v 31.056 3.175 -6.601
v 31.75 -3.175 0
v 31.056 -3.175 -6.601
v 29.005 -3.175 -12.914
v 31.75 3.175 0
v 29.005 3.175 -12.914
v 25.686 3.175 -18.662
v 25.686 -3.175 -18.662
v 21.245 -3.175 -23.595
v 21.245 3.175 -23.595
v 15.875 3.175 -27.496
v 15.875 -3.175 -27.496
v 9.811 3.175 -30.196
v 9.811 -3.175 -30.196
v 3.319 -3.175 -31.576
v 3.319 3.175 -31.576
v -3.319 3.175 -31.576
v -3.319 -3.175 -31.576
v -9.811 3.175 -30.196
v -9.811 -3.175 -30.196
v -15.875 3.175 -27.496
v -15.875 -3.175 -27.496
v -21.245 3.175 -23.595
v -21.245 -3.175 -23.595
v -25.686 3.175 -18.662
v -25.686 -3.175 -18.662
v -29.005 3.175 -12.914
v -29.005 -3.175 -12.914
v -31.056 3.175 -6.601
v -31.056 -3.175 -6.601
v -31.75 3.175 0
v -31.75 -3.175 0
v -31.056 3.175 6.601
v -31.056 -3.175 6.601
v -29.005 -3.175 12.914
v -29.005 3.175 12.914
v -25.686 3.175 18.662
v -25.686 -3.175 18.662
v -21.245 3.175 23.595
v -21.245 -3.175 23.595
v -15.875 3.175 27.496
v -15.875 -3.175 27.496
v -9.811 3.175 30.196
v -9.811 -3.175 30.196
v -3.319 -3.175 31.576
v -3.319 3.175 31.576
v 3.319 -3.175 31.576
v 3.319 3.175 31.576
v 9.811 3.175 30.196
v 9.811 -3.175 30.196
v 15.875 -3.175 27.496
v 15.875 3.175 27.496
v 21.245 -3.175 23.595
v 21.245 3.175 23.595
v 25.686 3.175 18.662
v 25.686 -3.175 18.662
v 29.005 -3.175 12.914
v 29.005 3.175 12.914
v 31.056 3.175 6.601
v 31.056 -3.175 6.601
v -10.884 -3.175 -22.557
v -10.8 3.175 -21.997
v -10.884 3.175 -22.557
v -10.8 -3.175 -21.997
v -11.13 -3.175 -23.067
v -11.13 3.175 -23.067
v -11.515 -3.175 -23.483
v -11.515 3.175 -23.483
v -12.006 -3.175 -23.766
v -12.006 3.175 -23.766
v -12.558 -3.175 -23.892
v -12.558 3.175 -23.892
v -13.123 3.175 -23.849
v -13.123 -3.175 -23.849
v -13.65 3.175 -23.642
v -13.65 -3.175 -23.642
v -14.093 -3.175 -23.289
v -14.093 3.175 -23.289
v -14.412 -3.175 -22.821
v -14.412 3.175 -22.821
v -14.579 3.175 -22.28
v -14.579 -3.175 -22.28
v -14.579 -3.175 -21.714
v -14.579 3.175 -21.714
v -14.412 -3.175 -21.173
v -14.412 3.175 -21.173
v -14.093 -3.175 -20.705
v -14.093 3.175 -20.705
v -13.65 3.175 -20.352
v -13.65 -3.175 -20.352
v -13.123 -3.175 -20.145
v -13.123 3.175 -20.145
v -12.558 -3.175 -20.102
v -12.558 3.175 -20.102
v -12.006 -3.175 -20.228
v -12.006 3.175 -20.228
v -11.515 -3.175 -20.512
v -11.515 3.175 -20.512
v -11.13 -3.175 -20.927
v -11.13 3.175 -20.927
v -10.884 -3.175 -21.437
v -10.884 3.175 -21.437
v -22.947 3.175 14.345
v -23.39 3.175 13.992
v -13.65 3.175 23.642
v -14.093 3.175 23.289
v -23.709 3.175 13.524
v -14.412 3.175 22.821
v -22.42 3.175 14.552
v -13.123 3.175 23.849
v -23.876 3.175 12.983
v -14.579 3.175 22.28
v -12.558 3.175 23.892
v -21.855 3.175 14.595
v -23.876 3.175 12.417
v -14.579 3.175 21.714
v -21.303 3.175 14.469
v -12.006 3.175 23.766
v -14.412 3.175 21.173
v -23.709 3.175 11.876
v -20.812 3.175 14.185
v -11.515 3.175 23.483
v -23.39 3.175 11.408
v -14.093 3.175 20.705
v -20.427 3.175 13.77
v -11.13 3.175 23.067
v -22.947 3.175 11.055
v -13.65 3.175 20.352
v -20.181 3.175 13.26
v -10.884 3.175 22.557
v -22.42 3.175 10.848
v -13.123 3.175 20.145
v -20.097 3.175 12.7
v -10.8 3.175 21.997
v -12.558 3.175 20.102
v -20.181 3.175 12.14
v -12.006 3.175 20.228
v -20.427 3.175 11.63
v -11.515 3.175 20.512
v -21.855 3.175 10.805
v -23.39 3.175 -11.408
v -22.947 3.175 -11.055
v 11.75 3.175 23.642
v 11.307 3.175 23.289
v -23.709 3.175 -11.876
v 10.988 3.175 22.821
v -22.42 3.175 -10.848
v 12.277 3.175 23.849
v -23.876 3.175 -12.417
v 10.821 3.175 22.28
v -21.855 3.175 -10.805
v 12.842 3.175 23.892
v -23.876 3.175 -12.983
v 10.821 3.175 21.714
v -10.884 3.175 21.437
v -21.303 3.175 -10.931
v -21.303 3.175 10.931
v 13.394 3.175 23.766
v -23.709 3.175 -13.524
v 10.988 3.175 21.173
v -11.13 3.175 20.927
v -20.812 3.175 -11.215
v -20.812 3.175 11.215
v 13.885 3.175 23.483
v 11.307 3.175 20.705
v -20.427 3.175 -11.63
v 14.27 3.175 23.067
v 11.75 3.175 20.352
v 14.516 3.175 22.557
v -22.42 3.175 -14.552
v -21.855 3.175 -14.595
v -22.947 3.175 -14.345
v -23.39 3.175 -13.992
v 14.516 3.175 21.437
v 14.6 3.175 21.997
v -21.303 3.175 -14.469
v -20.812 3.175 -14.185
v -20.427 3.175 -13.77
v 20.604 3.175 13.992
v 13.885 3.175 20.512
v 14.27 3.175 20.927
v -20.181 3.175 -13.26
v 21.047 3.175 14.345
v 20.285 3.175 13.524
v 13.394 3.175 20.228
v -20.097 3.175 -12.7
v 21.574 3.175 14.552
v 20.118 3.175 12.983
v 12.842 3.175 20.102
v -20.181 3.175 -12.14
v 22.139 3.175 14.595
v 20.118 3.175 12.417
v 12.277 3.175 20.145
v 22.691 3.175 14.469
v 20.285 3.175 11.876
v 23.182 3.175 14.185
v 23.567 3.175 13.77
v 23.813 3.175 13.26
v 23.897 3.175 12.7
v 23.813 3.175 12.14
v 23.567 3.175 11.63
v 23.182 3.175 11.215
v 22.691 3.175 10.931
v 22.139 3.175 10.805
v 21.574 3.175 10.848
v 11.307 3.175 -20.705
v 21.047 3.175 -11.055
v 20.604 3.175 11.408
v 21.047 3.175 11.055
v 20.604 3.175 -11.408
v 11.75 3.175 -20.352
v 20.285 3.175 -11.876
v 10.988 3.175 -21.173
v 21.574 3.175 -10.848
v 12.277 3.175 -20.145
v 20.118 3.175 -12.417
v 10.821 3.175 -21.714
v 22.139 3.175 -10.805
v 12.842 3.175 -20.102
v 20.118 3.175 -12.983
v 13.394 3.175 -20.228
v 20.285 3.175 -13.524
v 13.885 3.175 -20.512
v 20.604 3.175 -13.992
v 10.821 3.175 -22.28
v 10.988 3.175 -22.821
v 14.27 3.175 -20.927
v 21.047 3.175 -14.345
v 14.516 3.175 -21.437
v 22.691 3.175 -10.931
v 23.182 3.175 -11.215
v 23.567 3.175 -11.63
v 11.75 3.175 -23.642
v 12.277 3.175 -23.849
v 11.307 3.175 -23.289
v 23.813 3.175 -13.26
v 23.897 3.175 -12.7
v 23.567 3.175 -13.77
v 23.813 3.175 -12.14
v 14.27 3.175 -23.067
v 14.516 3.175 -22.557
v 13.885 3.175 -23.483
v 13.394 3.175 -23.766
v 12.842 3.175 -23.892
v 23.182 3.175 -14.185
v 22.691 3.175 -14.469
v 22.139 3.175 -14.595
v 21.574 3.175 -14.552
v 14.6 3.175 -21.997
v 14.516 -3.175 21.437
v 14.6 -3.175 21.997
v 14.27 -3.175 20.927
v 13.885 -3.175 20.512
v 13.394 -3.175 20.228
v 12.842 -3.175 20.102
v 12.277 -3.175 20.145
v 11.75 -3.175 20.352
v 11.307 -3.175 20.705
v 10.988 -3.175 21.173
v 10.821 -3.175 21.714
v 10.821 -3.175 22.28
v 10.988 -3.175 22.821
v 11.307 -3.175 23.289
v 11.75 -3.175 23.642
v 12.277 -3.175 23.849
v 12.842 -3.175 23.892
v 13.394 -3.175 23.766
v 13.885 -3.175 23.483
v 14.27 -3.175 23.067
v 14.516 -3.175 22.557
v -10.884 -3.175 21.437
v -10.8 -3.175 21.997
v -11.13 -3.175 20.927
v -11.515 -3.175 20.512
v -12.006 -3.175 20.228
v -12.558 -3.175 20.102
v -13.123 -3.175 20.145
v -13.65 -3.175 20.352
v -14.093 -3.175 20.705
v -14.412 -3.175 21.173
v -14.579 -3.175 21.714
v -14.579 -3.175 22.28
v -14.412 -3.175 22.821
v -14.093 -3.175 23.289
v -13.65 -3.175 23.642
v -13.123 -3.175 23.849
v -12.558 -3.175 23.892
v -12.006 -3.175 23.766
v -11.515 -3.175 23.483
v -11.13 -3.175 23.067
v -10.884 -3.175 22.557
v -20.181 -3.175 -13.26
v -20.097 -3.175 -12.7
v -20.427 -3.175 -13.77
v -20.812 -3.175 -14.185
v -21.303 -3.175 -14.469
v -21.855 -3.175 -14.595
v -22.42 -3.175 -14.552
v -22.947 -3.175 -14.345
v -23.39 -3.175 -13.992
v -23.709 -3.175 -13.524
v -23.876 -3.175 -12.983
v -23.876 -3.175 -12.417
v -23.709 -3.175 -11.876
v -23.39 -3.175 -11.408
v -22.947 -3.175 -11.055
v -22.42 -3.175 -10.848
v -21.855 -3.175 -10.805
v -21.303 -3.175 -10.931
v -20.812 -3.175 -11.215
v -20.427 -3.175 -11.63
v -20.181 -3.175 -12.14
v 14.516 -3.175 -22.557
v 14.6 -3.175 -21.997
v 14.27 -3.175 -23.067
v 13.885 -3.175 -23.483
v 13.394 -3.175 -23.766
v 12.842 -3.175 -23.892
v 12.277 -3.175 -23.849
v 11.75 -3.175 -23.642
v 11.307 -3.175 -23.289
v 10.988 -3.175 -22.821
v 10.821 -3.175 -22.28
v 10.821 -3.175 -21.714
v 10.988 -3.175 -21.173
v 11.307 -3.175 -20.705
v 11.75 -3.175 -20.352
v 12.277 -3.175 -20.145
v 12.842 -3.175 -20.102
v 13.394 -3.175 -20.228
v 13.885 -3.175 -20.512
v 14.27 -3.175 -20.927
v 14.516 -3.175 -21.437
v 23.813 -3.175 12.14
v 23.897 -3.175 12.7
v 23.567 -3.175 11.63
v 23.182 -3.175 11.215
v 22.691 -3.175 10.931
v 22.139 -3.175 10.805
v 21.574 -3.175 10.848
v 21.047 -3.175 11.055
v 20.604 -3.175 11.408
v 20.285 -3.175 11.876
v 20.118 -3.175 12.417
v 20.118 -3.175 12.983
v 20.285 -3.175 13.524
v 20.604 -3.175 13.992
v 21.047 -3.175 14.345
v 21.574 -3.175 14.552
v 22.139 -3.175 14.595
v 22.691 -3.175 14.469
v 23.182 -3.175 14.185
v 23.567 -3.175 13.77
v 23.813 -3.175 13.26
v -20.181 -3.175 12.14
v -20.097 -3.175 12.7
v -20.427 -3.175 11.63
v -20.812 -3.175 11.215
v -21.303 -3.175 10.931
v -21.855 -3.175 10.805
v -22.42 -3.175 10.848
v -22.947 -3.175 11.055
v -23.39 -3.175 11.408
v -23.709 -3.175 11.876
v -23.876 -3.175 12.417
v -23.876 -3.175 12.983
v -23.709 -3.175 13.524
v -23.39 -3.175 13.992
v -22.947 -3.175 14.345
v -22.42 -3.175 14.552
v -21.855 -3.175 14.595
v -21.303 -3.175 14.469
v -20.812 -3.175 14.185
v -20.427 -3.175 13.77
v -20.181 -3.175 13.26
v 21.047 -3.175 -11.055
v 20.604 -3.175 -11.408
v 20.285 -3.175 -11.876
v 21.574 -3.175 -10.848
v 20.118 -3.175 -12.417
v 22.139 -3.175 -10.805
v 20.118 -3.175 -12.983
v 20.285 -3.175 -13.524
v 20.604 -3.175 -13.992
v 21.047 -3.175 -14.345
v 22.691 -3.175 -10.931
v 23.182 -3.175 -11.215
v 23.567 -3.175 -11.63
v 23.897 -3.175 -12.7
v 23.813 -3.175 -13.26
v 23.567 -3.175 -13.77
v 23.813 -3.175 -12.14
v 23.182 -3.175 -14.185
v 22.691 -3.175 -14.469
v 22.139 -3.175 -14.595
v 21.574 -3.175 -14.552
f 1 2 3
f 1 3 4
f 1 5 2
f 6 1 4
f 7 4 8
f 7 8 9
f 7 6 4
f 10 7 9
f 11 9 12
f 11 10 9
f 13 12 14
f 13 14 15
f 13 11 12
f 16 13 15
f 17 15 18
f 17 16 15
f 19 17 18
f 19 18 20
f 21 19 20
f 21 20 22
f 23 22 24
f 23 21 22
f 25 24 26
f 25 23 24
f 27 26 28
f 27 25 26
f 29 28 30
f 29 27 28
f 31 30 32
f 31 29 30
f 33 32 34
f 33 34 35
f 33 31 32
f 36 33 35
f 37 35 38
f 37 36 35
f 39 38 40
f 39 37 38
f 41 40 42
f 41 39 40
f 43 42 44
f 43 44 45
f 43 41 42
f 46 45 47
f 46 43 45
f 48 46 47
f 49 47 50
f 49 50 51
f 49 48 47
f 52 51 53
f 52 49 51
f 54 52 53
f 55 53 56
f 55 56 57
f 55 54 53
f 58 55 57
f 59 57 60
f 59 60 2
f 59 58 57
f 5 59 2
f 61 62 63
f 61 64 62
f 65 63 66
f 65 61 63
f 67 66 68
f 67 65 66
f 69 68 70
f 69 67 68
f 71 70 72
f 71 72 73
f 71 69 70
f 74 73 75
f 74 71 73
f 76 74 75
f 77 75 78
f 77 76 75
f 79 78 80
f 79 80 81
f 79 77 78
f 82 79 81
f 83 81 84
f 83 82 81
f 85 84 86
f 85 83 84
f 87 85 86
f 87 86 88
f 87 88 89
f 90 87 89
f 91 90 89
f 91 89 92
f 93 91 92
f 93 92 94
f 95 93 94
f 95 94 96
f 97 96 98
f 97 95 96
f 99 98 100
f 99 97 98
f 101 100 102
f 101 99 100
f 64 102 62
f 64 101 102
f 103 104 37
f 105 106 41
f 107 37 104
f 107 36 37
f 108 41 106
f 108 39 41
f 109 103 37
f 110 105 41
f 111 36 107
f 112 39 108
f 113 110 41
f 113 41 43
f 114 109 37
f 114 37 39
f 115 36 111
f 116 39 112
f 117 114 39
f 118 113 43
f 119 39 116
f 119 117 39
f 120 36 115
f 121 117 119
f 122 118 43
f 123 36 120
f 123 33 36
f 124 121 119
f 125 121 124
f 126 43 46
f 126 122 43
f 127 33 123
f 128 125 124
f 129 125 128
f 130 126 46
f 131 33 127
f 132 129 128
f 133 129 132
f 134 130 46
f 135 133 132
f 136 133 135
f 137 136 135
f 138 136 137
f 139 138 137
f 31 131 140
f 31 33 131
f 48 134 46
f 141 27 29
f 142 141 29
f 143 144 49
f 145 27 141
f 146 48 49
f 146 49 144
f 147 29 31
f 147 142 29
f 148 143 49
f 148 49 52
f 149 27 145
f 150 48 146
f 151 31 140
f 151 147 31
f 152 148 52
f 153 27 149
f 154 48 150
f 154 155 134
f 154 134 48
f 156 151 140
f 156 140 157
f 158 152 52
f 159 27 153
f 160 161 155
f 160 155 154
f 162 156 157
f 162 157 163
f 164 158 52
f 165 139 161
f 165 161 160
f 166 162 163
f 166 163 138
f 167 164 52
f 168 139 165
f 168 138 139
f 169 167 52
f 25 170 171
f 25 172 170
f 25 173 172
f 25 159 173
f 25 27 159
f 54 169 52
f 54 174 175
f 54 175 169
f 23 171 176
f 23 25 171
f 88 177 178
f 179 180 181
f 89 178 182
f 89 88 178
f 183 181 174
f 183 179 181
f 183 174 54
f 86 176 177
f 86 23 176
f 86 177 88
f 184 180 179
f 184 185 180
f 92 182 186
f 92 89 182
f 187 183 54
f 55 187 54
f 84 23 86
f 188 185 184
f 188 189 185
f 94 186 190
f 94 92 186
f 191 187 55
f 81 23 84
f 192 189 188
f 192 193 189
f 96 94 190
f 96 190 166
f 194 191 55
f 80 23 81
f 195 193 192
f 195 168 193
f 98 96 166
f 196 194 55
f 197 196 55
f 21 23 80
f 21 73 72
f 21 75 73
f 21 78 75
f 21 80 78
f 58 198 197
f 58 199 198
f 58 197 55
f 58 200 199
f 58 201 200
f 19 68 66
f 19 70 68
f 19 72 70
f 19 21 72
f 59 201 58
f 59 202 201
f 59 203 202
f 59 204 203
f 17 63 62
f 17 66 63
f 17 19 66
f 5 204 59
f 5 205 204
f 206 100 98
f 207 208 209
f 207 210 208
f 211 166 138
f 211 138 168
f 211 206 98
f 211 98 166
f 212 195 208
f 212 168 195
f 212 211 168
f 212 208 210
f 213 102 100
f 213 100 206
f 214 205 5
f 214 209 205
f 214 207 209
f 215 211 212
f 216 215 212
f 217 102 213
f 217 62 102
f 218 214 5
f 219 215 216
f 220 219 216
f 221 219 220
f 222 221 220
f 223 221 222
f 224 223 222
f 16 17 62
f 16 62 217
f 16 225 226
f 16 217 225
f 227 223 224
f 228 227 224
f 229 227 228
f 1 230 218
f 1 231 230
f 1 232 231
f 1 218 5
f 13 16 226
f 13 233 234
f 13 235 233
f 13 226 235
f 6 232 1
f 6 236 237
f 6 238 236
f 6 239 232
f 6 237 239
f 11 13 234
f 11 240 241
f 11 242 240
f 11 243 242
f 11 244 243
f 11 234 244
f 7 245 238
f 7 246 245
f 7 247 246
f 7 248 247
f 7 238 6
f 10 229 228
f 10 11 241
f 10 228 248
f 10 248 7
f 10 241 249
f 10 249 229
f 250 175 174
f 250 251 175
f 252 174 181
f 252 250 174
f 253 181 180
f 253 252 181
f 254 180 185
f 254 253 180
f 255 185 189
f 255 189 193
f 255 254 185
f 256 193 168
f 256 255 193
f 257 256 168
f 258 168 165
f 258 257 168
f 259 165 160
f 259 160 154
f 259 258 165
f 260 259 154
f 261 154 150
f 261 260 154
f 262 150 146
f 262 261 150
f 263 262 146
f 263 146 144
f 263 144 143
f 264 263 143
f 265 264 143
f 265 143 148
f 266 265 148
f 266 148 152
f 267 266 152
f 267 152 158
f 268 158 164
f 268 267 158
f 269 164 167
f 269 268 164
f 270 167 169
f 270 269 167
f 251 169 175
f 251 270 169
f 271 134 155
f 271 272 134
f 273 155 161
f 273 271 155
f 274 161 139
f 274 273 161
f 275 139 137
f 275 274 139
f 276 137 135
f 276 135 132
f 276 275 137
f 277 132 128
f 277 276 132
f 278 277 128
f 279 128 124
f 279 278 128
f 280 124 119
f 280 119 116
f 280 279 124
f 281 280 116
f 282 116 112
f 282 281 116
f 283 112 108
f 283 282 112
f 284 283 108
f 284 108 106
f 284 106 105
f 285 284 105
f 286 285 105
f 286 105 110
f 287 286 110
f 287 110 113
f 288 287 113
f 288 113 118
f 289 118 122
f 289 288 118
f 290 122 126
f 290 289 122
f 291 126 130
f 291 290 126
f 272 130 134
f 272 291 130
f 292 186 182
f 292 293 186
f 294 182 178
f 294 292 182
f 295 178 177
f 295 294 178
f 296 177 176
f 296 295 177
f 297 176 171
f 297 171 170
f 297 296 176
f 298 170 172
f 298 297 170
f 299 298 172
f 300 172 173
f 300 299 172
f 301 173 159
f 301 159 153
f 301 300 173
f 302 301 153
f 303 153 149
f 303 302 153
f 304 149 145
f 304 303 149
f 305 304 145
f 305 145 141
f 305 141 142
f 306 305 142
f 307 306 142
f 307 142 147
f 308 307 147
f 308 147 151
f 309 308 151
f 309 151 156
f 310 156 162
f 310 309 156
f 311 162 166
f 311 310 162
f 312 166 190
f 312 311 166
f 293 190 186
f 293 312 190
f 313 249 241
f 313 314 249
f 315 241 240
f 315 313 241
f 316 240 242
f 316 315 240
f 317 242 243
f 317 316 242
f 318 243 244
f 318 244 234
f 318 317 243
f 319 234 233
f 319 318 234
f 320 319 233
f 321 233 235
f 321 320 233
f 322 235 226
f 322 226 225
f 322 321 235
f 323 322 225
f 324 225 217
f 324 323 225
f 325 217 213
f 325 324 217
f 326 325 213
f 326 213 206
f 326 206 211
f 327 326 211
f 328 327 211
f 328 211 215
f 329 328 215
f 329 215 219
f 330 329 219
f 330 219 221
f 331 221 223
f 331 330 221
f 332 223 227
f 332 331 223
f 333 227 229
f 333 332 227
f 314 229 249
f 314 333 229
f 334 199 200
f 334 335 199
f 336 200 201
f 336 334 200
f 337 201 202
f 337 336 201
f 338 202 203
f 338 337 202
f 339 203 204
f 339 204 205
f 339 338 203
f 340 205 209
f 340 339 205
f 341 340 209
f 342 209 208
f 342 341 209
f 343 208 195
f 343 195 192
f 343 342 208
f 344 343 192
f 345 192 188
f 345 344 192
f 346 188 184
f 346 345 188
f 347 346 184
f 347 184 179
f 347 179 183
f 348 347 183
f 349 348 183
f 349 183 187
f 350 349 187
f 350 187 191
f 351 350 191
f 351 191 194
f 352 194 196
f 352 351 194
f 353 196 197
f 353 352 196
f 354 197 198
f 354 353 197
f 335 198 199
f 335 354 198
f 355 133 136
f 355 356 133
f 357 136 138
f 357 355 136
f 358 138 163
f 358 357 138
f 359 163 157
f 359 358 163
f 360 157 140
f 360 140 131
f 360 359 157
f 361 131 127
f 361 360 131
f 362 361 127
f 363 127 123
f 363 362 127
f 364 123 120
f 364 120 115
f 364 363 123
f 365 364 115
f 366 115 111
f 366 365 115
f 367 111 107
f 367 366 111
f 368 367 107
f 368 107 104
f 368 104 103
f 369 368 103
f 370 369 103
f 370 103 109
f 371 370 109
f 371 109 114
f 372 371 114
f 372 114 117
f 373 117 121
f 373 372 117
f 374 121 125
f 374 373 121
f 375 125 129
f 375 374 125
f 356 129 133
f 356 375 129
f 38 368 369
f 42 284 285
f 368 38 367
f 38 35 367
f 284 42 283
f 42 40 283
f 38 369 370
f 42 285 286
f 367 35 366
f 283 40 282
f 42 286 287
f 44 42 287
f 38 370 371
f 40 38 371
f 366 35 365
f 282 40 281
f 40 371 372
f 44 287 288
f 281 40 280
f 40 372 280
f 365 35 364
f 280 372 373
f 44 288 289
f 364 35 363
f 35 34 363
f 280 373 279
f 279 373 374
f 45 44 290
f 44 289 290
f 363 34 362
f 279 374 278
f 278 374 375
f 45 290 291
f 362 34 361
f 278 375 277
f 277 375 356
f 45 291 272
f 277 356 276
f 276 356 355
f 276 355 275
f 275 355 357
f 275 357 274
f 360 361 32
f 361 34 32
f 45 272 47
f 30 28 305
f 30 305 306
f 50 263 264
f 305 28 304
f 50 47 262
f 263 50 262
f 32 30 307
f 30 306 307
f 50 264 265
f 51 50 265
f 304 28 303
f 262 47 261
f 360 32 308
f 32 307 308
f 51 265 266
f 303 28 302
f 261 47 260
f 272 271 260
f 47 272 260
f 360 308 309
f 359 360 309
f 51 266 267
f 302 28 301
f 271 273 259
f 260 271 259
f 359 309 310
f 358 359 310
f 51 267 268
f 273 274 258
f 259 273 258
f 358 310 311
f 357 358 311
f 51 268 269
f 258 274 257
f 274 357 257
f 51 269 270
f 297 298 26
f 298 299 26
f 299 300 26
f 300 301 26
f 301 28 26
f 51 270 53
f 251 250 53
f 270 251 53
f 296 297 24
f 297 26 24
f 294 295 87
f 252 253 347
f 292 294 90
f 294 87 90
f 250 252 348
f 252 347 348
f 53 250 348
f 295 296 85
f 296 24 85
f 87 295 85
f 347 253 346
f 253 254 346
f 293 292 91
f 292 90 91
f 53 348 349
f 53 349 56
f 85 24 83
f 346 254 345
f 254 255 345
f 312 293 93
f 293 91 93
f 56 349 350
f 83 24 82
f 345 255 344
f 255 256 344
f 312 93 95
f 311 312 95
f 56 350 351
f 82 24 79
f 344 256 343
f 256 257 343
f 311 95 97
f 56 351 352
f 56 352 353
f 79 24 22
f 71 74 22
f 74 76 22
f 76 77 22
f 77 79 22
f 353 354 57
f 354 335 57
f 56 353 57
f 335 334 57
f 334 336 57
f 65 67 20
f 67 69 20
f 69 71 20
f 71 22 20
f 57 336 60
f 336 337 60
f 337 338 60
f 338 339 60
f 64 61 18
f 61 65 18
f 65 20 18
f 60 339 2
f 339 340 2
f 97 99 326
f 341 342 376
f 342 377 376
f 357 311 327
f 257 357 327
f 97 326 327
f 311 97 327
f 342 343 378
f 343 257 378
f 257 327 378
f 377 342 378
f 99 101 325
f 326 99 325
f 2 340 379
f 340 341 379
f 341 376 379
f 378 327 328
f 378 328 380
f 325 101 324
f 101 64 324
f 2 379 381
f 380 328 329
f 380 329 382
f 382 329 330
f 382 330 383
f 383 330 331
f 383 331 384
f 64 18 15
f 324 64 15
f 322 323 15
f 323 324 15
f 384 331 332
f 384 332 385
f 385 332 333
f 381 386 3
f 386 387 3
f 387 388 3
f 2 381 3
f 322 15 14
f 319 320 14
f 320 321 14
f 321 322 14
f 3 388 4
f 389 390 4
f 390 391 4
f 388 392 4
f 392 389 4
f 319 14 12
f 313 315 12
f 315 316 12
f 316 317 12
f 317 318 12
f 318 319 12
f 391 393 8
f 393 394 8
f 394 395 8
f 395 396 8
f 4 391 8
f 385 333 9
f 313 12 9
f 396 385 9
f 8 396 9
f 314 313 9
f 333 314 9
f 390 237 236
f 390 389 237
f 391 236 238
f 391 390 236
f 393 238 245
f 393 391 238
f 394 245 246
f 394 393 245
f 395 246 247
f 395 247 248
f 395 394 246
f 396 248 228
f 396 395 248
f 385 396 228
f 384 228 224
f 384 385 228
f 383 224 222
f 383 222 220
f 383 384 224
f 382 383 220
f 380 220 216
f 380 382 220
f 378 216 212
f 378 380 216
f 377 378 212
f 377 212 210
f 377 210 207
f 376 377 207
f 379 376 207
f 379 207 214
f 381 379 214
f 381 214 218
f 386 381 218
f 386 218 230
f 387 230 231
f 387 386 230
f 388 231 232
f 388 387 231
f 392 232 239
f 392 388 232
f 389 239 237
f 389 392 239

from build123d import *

# Parameters (mm, degrees)
SKETCH1_R           = 31.75
SKETCH1_R_2         = 1.90000001
BOSS_EXTRUDE1_DEPTH = 3.175


with BuildPart() as part:
    # Sketch1 → Boss-Extrude1 (new body, symmetric)
    with BuildSketch(Plane(origin=(0, 0, 0), x_dir=(1, 0, 0), z_dir=(0, 1, 0))):
        Circle(SKETCH1_R)
        with Locations((21.997045256, 12.7)):
            Circle(SKETCH1_R_2, mode=Mode.SUBTRACT)
        with Locations((21.997045256, -12.7)):
            Circle(SKETCH1_R_2, mode=Mode.SUBTRACT)
        with Locations((-12.7, -21.997045256)):
            Circle(SKETCH1_R_2, mode=Mode.SUBTRACT)
        with Locations((12.7, -21.997045256)):
            Circle(SKETCH1_R_2, mode=Mode.SUBTRACT)
        with Locations((-21.997045256, 12.7)):
            Circle(SKETCH1_R_2, mode=Mode.SUBTRACT)
        with Locations((-21.997045256, -12.7)):
            Circle(SKETCH1_R_2, mode=Mode.SUBTRACT)
        with Locations((12.7, 21.997045256)):
            Circle(SKETCH1_R_2, mode=Mode.SUBTRACT)
        with Locations((-12.7, 21.997045256)):
            Circle(SKETCH1_R_2, mode=Mode.SUBTRACT)
    extrude(amount=BOSS_EXTRUDE1_DEPTH, both=True)


solid = part.part
